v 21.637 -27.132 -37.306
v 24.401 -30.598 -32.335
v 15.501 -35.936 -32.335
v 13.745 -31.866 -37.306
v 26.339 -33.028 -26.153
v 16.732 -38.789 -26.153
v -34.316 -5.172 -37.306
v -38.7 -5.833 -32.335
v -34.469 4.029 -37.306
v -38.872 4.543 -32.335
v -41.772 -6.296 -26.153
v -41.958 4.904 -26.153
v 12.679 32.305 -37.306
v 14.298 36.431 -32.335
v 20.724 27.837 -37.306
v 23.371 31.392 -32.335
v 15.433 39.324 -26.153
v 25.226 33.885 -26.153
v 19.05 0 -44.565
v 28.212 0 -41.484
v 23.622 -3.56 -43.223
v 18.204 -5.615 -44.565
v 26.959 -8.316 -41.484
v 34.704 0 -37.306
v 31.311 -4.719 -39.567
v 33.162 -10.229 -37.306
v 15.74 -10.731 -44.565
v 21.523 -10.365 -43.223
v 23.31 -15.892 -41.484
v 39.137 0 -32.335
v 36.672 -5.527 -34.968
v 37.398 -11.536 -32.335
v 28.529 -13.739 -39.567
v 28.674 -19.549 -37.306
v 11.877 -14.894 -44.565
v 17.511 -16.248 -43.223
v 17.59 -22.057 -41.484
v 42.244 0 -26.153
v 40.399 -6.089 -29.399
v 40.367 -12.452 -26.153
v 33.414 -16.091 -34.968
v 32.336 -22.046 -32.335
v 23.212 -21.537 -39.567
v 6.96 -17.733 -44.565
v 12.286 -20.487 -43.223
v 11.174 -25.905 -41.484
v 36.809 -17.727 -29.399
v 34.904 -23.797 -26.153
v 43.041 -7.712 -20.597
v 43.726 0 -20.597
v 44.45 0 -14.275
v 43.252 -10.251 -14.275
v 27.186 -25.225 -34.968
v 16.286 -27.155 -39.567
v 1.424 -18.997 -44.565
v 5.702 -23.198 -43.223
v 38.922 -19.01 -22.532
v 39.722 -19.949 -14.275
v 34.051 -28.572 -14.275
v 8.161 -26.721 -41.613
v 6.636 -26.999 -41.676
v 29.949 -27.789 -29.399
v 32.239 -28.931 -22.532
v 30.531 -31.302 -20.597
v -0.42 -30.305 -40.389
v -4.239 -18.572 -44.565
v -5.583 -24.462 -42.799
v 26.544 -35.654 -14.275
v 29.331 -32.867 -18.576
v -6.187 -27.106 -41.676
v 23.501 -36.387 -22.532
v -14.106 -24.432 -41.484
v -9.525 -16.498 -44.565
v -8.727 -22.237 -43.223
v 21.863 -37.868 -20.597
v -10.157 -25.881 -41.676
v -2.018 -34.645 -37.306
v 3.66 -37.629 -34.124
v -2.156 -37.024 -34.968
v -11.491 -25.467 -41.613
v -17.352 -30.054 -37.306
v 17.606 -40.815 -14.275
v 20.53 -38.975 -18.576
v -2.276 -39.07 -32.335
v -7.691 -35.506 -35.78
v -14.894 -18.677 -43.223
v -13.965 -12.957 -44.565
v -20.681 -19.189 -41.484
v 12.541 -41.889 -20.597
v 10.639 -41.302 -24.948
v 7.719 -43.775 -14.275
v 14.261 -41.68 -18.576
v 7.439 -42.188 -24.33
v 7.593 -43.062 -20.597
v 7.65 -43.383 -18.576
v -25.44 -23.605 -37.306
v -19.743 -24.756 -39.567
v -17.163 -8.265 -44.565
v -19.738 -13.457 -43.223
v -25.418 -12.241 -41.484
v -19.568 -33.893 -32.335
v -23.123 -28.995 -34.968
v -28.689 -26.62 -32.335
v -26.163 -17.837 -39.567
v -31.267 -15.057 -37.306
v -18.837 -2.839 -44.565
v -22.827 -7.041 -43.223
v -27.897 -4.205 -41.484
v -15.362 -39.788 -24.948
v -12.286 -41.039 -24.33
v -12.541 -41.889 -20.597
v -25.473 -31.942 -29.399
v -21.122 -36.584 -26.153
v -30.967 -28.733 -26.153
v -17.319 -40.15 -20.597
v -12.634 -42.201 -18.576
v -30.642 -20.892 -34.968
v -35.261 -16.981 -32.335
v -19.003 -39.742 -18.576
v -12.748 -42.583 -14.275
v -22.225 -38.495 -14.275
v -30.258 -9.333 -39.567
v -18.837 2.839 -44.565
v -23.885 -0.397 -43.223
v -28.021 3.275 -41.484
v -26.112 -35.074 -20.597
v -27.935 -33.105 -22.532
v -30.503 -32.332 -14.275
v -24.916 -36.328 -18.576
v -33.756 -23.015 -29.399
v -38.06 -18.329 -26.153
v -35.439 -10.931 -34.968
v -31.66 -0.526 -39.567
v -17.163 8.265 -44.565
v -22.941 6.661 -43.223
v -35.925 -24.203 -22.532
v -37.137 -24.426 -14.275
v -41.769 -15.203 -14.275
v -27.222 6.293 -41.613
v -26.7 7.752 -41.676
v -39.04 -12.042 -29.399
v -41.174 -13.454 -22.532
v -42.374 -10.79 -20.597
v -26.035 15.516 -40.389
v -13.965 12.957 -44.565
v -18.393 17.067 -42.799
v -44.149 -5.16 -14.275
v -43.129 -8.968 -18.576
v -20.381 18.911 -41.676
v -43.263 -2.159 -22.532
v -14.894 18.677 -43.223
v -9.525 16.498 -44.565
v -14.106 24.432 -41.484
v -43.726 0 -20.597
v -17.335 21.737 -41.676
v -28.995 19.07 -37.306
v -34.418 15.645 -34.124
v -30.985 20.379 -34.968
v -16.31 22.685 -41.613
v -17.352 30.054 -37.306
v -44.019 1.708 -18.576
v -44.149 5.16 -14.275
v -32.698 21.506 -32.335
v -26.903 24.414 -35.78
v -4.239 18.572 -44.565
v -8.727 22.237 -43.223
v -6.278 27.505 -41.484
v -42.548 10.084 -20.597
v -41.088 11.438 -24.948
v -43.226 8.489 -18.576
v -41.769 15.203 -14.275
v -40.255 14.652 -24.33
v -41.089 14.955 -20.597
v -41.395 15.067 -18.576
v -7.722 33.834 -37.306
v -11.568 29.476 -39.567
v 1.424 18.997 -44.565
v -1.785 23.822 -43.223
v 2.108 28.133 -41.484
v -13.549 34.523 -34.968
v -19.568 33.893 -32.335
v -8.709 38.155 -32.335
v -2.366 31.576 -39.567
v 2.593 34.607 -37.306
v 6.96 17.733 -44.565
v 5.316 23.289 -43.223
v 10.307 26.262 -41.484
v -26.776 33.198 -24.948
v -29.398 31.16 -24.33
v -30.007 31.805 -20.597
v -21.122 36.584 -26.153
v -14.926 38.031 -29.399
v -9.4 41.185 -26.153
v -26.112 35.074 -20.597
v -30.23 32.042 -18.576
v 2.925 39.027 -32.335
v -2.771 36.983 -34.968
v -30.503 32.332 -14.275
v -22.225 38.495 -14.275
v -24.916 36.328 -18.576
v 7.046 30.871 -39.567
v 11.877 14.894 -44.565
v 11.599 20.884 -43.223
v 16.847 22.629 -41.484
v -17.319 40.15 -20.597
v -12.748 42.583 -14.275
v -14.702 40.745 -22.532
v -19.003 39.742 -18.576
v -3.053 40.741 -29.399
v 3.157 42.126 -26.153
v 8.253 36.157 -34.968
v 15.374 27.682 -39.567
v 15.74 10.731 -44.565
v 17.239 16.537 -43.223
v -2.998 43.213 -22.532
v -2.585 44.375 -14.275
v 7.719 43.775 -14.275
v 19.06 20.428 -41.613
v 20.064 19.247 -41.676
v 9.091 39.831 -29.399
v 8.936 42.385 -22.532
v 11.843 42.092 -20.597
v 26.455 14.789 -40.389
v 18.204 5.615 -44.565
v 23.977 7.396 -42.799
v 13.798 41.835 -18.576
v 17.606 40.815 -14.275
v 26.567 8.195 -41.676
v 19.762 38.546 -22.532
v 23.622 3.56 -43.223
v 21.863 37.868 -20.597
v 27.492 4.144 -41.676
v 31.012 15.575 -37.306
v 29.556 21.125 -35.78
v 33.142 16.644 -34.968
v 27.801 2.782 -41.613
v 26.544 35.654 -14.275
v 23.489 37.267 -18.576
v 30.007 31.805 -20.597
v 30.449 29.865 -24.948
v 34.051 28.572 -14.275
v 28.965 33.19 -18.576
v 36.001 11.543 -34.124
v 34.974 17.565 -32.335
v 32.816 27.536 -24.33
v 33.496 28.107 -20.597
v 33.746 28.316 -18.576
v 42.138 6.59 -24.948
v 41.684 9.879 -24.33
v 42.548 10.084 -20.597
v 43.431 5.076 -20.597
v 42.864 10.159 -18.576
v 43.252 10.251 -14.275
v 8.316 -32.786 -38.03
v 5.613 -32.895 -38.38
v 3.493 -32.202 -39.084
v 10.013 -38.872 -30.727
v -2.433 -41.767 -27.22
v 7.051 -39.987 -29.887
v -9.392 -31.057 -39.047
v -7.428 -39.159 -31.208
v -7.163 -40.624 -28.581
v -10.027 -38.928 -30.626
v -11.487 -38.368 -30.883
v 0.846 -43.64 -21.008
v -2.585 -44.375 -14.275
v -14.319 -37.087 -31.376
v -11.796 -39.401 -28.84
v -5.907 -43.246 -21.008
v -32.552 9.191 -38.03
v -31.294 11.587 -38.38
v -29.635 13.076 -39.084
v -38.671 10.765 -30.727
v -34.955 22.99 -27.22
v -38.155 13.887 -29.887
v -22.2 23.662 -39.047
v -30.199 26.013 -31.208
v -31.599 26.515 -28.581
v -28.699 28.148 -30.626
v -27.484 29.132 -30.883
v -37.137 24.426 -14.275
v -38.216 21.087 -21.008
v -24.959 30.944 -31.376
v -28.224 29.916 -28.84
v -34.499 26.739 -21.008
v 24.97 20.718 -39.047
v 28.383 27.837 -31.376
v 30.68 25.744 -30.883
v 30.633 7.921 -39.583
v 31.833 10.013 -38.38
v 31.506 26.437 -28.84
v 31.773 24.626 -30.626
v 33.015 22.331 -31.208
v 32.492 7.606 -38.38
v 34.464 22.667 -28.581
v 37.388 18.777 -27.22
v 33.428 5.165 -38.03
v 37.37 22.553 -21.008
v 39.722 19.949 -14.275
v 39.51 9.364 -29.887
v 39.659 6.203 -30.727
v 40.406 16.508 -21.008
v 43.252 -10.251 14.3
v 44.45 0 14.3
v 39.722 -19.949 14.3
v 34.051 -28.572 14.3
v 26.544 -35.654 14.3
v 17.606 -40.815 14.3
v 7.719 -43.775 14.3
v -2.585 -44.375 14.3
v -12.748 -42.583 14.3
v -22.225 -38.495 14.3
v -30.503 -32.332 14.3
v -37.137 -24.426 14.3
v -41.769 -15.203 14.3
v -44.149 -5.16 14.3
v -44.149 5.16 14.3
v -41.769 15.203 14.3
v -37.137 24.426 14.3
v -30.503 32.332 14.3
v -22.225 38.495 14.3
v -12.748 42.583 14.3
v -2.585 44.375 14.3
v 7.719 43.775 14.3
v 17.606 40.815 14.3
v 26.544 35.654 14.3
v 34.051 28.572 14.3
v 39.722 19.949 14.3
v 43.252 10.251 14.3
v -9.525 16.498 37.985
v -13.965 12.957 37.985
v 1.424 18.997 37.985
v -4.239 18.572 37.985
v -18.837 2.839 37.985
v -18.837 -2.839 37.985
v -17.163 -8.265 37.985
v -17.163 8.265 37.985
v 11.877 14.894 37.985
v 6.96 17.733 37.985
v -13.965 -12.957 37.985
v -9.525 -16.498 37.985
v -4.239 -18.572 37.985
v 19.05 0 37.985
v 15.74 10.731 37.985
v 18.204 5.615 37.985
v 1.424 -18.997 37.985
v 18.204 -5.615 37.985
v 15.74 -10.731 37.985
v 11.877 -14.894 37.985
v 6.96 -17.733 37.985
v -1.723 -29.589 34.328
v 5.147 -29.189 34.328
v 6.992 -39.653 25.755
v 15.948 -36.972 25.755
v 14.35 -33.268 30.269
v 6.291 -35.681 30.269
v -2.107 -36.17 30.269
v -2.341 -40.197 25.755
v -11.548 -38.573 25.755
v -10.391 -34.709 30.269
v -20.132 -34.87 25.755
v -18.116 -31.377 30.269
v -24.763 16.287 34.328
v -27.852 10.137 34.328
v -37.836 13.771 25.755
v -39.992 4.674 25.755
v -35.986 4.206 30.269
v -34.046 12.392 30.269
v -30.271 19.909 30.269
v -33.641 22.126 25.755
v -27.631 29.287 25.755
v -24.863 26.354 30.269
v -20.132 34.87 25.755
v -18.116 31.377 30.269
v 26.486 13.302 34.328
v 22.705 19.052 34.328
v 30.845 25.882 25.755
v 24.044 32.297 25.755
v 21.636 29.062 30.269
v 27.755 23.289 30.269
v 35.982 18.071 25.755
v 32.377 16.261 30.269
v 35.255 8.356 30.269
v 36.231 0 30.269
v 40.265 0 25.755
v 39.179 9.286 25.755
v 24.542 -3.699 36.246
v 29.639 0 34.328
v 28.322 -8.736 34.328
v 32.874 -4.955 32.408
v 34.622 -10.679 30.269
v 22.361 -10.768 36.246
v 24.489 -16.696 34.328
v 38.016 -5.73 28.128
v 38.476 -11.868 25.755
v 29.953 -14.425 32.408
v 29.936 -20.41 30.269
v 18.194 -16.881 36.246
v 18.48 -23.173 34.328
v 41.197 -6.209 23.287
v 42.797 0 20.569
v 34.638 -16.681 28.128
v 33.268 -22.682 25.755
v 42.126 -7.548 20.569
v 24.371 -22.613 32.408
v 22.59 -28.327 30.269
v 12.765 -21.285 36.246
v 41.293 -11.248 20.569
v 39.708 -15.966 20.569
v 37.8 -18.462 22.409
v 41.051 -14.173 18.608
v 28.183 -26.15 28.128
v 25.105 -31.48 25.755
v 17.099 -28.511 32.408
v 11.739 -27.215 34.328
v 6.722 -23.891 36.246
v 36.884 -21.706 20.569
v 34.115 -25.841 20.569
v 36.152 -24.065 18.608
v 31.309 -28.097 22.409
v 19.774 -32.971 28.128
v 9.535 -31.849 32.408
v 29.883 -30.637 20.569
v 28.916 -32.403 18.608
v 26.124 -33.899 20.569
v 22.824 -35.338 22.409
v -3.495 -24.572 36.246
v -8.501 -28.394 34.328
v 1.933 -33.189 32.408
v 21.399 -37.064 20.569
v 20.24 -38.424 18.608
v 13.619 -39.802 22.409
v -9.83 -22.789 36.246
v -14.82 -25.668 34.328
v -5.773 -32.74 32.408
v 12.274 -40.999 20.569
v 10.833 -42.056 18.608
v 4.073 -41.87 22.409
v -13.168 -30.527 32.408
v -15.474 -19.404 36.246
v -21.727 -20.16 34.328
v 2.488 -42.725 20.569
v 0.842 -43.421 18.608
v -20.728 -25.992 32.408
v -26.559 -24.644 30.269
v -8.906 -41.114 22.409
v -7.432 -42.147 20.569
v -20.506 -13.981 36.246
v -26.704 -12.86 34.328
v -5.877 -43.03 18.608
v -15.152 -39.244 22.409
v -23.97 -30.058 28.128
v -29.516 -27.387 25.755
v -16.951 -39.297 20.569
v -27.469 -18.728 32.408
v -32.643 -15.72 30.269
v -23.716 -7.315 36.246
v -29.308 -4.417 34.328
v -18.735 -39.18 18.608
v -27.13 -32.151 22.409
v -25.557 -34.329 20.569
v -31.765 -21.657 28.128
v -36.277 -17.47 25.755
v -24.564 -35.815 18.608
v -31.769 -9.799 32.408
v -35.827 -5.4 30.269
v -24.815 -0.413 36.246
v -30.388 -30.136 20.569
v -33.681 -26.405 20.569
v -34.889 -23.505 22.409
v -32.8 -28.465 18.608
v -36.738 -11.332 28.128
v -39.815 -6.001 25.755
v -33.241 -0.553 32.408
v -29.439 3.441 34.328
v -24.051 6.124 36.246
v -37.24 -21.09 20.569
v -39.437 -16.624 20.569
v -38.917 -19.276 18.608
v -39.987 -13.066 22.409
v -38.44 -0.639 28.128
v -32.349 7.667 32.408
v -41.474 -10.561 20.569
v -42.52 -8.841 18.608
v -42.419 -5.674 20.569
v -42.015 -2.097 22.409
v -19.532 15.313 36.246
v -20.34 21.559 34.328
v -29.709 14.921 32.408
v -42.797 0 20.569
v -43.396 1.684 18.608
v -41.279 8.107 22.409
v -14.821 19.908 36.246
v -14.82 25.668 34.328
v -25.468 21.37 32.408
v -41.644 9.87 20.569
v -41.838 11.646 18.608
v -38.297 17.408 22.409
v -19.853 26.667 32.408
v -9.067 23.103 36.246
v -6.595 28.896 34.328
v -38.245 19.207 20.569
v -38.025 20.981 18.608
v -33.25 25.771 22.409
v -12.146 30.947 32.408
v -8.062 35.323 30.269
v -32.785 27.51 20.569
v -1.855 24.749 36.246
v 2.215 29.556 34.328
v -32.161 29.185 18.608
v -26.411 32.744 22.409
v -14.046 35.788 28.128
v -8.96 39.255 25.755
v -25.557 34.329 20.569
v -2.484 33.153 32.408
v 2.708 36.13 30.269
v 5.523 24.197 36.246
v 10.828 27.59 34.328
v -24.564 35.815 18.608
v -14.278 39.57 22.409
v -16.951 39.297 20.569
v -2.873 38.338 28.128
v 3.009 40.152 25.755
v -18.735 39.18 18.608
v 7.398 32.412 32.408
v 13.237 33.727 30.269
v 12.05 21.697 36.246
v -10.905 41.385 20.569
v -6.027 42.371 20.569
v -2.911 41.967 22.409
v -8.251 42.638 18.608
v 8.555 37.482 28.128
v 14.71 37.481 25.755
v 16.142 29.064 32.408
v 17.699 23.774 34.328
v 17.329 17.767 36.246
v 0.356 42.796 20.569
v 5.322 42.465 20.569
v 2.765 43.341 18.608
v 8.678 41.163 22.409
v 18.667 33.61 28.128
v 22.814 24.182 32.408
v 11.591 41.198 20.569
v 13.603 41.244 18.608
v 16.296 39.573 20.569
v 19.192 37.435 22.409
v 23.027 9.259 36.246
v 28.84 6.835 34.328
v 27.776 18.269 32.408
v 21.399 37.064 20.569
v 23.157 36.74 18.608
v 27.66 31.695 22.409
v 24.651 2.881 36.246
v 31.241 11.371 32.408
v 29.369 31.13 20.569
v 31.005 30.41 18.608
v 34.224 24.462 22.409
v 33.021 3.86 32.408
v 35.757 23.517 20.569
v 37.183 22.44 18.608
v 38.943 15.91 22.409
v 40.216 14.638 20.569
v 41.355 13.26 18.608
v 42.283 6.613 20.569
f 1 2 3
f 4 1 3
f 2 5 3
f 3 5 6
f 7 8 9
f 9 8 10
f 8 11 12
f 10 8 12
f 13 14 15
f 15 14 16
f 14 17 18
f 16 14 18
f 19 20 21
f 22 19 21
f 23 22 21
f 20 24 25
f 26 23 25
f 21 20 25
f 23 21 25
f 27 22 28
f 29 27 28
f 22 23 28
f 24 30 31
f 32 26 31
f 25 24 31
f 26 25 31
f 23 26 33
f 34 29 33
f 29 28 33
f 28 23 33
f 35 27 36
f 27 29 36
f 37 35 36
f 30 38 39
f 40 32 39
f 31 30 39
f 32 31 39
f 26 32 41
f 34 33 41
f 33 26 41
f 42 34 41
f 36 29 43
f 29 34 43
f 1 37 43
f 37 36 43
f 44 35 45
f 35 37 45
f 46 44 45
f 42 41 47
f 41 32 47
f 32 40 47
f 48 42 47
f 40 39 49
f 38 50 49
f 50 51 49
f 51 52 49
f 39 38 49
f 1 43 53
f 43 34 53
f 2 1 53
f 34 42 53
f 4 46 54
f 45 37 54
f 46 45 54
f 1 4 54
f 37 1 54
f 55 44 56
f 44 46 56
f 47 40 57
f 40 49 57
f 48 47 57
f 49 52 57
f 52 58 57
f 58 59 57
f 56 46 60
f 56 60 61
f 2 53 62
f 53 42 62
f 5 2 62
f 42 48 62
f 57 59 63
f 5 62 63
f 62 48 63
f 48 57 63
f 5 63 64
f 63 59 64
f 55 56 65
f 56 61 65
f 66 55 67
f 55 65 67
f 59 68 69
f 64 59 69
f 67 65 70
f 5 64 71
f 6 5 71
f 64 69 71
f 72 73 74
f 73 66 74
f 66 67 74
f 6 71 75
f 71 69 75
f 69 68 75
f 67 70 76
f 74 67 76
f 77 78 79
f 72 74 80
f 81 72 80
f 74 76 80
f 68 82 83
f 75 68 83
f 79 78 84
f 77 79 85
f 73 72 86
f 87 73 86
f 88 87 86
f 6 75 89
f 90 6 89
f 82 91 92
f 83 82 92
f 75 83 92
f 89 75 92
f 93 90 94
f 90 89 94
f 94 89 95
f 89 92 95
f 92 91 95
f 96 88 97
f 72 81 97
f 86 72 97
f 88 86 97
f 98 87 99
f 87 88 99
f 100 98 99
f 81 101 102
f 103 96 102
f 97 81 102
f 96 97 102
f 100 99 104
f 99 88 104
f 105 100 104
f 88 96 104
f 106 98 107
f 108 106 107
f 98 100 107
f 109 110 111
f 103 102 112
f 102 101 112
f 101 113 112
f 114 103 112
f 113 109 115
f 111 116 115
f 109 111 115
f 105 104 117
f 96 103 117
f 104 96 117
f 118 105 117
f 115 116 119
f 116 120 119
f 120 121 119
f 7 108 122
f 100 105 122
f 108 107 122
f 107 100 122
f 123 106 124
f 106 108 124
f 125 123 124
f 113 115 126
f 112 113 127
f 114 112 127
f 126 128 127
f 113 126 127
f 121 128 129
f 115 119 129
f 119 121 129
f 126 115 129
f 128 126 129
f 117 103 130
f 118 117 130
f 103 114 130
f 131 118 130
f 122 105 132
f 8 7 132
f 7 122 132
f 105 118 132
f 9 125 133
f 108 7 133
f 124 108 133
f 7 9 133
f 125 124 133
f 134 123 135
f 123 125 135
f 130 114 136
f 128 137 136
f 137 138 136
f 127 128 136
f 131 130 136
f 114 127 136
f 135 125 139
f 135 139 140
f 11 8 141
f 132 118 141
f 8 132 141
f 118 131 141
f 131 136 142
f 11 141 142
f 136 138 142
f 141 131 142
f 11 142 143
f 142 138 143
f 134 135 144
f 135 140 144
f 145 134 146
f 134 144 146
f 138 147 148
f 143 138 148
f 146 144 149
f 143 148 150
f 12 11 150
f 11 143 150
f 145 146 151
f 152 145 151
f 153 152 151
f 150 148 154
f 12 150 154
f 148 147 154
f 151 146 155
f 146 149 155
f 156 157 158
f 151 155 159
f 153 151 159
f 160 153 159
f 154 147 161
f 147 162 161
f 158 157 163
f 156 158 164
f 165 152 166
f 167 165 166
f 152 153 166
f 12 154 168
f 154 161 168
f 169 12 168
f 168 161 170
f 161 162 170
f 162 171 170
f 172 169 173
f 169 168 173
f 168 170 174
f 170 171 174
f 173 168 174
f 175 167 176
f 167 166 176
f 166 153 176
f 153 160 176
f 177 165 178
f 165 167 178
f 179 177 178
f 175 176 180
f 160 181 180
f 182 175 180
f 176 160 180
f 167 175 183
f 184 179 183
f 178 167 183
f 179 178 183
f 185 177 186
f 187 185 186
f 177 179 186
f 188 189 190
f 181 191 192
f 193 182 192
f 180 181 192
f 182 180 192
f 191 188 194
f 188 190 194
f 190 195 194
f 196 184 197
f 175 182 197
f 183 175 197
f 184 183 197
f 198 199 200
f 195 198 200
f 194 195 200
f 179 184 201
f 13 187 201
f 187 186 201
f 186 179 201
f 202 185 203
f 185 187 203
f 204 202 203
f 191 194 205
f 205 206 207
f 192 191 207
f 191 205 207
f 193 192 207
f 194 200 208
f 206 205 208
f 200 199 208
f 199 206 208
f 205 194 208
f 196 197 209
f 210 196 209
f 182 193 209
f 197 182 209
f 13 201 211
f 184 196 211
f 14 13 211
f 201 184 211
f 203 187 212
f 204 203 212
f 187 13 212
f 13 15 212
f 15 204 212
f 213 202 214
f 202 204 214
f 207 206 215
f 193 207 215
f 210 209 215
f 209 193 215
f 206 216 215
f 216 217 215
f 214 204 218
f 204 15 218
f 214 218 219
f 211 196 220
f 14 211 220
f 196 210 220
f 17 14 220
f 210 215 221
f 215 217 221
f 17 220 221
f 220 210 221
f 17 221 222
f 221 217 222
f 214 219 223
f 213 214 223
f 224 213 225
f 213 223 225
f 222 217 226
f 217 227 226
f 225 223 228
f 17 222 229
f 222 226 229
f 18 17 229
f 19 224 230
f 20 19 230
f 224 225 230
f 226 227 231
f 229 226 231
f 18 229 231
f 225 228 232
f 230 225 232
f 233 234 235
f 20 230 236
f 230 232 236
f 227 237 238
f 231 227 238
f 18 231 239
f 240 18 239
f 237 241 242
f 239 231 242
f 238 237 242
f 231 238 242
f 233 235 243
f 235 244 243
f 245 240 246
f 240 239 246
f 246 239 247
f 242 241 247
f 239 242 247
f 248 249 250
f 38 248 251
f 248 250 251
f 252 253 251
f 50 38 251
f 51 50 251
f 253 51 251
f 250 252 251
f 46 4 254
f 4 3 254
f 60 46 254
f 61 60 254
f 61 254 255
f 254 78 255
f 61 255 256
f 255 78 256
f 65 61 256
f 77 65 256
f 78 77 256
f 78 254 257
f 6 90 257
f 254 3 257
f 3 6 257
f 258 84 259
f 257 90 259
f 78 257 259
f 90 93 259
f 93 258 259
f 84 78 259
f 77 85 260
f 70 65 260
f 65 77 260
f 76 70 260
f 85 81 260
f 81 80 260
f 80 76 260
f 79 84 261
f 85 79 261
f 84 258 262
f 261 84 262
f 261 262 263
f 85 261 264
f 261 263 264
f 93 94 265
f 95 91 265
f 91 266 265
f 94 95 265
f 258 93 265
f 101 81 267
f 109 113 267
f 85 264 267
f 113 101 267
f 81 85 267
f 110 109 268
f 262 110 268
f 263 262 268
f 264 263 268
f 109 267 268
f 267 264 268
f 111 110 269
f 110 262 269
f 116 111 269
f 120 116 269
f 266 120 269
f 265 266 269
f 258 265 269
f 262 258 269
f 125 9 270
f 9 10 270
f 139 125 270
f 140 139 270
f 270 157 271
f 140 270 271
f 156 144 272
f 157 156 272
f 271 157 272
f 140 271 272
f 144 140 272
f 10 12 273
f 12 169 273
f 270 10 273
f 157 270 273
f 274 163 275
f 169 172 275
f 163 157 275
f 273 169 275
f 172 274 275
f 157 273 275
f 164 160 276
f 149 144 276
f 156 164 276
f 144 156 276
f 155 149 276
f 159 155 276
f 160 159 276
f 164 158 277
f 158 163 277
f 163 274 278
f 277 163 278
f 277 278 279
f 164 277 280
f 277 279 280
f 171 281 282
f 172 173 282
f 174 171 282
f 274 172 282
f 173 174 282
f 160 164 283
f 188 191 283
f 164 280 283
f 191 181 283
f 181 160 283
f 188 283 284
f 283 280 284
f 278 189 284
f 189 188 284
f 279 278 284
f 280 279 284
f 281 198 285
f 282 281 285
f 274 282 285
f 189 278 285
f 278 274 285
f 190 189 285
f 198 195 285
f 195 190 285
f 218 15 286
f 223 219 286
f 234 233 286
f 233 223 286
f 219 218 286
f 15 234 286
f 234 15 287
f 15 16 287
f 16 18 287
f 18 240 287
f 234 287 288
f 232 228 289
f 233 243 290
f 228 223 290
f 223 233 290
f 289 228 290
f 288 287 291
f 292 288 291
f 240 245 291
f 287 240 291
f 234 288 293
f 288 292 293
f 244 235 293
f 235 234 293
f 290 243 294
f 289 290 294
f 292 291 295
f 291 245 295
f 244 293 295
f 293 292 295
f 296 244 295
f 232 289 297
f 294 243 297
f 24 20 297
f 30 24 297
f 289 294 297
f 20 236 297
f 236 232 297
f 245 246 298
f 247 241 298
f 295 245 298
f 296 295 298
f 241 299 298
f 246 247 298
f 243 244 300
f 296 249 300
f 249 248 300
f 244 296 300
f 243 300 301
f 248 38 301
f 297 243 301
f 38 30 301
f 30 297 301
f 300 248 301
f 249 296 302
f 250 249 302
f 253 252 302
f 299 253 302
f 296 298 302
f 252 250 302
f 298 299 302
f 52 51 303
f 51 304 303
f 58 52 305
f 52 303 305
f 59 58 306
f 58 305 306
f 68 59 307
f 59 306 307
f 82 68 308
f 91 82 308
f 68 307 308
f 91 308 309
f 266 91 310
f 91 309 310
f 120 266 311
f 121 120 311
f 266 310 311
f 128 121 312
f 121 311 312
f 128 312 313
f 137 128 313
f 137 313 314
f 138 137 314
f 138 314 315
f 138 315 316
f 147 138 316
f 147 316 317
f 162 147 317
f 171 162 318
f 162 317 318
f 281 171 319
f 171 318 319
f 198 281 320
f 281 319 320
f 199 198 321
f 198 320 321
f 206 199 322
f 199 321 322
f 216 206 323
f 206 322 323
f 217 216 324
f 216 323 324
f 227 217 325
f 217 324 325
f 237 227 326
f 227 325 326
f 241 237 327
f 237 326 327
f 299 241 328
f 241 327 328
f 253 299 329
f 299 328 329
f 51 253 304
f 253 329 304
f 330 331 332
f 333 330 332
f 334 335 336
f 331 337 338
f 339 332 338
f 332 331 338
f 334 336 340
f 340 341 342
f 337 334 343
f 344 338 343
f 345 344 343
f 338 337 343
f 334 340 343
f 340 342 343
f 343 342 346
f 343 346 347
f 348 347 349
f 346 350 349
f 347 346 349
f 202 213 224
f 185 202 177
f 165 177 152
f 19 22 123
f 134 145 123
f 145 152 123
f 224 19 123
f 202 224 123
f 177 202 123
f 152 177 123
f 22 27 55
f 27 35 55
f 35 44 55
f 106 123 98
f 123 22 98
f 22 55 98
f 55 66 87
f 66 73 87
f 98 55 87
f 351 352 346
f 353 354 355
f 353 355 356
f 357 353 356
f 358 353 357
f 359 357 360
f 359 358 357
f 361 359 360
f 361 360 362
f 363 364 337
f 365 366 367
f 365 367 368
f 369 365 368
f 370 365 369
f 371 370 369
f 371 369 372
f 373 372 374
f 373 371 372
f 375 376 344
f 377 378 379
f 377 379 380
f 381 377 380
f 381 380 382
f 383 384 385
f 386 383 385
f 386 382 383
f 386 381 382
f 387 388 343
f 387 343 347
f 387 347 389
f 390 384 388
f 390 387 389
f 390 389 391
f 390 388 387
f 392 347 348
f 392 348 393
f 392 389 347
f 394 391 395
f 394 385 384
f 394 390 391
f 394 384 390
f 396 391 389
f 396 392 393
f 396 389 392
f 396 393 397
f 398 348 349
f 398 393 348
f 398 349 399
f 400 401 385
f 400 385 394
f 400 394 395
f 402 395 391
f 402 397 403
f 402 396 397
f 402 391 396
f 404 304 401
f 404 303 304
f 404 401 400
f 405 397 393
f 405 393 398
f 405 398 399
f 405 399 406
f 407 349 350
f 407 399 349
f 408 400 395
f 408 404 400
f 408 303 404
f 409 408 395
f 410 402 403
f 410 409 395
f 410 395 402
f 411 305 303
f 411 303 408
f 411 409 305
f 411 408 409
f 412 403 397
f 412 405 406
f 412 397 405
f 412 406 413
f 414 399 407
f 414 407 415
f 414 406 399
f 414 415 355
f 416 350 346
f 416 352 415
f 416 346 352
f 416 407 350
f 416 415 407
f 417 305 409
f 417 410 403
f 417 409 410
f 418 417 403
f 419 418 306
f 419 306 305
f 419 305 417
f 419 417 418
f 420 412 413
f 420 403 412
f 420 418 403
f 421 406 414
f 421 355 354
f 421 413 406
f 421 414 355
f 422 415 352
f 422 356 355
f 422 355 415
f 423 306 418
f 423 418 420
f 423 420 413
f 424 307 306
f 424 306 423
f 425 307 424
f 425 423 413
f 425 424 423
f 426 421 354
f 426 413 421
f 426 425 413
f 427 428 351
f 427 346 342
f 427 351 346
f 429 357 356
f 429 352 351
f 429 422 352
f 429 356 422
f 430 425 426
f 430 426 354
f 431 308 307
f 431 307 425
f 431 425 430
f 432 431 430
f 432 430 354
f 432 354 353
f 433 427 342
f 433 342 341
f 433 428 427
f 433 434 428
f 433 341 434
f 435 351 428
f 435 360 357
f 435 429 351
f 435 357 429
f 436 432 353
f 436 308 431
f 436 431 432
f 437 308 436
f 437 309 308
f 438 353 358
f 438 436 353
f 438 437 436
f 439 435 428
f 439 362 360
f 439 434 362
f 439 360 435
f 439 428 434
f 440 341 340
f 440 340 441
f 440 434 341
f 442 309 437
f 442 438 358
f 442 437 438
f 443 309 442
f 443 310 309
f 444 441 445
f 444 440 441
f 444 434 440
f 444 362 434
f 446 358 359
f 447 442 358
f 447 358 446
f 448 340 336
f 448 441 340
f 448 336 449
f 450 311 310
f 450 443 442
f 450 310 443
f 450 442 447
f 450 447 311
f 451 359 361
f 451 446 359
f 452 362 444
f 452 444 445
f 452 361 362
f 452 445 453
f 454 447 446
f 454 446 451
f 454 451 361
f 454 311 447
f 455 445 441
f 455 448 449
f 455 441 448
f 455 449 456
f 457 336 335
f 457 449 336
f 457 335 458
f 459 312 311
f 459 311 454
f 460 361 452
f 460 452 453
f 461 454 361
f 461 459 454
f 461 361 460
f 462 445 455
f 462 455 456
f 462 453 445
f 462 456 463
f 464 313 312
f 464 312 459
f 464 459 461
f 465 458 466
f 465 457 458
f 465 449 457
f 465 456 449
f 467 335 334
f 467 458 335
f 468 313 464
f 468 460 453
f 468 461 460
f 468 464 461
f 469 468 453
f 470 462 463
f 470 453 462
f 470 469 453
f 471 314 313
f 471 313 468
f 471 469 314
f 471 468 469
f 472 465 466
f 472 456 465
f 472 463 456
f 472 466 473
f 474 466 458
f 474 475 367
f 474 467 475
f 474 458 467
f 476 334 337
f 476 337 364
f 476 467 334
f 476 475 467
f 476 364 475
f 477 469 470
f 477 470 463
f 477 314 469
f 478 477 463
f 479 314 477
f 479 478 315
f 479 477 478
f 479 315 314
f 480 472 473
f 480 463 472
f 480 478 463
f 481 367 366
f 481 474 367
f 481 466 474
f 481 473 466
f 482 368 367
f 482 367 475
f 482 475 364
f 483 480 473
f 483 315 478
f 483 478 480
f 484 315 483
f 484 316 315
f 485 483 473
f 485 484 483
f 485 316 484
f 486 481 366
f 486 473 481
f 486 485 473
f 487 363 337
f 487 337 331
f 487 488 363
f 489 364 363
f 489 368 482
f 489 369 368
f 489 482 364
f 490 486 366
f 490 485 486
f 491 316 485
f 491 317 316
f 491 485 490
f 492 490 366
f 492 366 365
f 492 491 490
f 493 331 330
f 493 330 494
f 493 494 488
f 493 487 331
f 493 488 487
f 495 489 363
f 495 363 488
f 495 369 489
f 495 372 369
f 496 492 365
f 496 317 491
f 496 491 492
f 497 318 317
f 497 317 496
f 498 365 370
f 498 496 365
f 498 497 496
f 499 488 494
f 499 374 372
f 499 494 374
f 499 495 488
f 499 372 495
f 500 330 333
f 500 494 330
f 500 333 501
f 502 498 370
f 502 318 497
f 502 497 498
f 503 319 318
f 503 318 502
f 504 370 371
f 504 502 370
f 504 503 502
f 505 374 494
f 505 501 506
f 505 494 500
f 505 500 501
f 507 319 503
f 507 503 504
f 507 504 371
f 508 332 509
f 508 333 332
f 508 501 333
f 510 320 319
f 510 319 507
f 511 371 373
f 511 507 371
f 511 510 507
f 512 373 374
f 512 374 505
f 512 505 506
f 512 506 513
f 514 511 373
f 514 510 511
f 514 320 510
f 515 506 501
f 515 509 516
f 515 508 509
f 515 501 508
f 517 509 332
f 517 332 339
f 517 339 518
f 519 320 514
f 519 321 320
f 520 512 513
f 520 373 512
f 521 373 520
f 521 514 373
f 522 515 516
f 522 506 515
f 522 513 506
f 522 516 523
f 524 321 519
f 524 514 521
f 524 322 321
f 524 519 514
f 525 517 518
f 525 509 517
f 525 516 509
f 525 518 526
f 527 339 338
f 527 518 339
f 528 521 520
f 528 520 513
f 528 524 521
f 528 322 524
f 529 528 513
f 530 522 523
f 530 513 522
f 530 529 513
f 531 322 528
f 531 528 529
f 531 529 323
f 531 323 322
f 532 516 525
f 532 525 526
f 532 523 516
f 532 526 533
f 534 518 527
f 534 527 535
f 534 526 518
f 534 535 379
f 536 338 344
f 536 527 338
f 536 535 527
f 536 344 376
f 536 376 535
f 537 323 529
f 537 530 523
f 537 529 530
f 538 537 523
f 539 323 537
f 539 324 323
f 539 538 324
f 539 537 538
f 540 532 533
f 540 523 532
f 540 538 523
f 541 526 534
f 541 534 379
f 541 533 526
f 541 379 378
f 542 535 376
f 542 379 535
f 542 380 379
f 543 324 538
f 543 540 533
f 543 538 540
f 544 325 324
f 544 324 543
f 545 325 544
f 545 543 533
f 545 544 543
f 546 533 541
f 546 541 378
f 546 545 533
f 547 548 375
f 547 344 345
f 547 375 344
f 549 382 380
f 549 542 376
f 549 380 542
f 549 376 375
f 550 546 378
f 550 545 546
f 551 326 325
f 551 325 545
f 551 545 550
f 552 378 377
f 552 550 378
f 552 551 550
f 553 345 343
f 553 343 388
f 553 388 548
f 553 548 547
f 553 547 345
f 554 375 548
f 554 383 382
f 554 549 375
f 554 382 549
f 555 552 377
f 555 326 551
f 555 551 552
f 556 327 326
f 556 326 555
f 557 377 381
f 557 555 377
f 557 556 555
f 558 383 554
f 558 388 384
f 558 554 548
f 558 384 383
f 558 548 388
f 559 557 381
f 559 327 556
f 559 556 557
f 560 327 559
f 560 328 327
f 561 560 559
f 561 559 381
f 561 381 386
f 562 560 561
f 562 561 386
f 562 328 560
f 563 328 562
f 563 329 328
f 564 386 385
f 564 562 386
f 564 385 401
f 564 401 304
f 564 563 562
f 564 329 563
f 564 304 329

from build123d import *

# Parameters (mm, degrees)
F0_W = 44.45
F0_H = 28.575


with BuildPart() as f1:
    # F0 (on Front) → F1 (revolve)
    with BuildSketch(Plane.XZ):
        with Locations((22.225, 0.0121624306)):
            Rectangle(F0_W, F0_H)
    revolve(axis=Axis((0, 0, -3.2896416128), (0, 0, -1)))

    # F0 (on Front) → F2 (revolve)
    with BuildSketch(Plane.XZ):
        with BuildLine():
            Line((44.45, -14.2753375694), (0, -14.2753375694))
            Line((0, -14.2753375694), (0, -44.5646416128))
            Line((0, -44.5646416128), (19.05, -44.5646416128))
            add(Edge.make_bspline(
                [(19.05, -44.5646416128), (35.2008901536, -40.9282892942), (43.5626022518, -31.5213650465), (44.45, -14.2753375694)],
                knots=[0, 0, 0, 0, 39.5297601742, 39.5297601742, 39.5297601742, 39.5297601742], degree=3))
        make_face()
    revolve(axis=Axis((0, 0, -3.2896416128), (0, 0, -1)))

    # F0 (on Front) → F3 (revolve)
    with BuildSketch(Plane.XZ):
        with BuildLine():
            Line((19.05, 37.9853583872), (0, 37.9853583872))
            Line((0, 37.9853583872), (0, 14.2996624306))
            Line((0, 14.2996624306), (44.45, 14.2996624306))
            add(Edge.make_bspline(
                [(19.05, 37.9853583872), (36.7687121034, 33.2818962634), (41.9947765768, 27.0106121898), (44.45, 14.2996624306)],
                knots=[0, 0, 0, 0, 34.7299898208, 34.7299898208, 34.7299898208, 34.7299898208], degree=3))
        make_face()
    revolve(axis=Axis((0, 0, -3.2896416128), (0, 0, -1)))


solid = f1.part
